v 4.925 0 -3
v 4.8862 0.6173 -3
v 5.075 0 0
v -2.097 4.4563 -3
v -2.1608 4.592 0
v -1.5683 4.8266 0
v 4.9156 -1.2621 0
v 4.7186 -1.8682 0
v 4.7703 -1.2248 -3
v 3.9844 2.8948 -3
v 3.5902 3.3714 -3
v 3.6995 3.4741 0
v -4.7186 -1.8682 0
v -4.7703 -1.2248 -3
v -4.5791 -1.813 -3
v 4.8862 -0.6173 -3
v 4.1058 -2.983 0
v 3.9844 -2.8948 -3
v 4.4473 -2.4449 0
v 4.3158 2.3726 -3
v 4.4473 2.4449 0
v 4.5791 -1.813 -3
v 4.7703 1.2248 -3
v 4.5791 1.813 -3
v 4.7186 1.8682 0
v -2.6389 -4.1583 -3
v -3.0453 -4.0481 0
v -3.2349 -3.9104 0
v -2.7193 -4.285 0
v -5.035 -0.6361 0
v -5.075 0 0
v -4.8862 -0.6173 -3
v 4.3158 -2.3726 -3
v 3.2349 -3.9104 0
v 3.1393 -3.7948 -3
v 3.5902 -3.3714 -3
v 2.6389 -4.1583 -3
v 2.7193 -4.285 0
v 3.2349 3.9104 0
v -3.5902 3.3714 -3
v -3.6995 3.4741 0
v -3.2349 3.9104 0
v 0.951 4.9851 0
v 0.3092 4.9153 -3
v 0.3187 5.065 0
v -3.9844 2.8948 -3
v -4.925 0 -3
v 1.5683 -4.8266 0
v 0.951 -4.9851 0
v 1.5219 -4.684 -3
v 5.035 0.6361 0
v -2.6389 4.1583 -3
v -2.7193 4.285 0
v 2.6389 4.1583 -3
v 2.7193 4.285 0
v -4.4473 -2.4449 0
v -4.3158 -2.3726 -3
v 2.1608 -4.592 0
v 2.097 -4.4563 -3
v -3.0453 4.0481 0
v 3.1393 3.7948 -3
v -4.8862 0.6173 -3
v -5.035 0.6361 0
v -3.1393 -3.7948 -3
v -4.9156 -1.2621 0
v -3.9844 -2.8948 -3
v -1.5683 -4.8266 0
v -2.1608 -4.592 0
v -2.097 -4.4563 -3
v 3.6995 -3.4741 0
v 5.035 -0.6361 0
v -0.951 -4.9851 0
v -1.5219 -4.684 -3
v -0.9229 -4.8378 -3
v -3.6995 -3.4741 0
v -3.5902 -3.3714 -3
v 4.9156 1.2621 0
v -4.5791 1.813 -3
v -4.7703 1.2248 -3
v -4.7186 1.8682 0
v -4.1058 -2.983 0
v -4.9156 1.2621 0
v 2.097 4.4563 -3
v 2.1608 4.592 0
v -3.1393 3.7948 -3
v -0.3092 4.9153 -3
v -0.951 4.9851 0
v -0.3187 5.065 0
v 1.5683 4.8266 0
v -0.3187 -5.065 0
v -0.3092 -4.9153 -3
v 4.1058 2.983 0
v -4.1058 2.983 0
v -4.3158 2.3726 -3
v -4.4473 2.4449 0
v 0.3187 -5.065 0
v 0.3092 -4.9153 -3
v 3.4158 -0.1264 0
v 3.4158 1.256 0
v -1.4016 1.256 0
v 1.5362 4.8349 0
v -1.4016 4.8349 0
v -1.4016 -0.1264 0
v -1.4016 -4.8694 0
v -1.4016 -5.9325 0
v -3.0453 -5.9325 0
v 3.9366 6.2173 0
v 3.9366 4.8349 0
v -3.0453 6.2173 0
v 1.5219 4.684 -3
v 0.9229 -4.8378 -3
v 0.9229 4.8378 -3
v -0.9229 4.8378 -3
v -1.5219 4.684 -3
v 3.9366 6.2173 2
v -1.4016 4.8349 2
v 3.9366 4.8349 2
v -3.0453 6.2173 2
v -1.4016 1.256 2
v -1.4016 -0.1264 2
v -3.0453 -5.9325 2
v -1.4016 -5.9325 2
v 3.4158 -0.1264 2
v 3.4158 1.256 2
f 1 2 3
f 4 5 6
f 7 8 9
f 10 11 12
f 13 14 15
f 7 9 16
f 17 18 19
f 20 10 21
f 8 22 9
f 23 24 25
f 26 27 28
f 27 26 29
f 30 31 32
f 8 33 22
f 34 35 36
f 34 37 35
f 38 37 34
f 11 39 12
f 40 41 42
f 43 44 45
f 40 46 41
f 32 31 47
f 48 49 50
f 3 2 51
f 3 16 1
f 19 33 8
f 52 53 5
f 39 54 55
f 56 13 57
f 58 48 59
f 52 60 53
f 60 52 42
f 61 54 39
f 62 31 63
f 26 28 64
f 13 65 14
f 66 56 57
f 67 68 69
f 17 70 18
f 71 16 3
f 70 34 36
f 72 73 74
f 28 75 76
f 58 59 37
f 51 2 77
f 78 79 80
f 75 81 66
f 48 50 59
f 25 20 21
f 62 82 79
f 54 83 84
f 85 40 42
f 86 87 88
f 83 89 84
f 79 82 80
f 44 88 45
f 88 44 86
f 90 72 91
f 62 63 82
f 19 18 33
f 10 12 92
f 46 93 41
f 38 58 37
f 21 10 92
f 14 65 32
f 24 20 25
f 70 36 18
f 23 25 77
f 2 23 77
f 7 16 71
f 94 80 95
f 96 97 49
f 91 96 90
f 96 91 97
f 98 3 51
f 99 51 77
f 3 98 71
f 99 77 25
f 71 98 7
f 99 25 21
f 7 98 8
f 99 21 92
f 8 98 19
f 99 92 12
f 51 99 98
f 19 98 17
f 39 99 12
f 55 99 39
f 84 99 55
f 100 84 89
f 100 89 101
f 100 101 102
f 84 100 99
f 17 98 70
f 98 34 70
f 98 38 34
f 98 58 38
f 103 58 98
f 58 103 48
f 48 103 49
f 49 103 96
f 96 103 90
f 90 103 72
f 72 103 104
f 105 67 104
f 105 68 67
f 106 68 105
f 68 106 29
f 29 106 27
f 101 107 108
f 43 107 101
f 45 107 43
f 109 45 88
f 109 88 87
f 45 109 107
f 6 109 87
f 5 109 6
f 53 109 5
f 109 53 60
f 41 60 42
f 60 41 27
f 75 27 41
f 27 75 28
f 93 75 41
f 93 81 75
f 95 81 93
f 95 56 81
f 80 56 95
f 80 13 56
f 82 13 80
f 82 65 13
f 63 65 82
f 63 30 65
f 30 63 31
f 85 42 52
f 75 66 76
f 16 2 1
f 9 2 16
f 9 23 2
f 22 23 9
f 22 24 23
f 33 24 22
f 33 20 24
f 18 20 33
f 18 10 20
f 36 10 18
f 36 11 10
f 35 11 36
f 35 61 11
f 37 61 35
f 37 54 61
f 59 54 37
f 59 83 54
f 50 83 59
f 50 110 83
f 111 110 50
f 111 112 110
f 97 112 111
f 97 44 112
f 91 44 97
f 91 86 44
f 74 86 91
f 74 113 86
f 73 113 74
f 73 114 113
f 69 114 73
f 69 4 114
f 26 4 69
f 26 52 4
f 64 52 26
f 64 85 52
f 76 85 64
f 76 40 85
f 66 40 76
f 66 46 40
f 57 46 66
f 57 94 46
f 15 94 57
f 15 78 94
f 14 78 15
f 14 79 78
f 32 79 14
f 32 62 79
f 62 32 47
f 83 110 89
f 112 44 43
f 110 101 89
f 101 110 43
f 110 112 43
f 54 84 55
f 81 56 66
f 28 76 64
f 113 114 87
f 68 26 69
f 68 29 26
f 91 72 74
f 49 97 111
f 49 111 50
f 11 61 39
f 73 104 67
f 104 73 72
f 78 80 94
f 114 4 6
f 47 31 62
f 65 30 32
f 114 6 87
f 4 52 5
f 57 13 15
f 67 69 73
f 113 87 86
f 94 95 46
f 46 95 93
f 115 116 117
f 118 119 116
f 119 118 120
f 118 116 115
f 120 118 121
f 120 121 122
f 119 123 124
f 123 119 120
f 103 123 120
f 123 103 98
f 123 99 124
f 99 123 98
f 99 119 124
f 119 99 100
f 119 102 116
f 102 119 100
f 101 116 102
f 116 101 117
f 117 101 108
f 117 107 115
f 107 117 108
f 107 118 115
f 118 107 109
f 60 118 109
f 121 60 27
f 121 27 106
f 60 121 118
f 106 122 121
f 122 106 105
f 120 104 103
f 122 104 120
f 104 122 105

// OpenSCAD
$fn = 50;

difference() {
	union() {
		translate(v = [0, 0, -3.0]) {
			cylinder(h = 3, r1 = 4.925, r2 = 5.075);
		}
		linear_extrude(height = 2) {
			text(font = "Impact", halign = "center", size = 12, text = "F", valign = "center");
		}
	}
	union();
}
